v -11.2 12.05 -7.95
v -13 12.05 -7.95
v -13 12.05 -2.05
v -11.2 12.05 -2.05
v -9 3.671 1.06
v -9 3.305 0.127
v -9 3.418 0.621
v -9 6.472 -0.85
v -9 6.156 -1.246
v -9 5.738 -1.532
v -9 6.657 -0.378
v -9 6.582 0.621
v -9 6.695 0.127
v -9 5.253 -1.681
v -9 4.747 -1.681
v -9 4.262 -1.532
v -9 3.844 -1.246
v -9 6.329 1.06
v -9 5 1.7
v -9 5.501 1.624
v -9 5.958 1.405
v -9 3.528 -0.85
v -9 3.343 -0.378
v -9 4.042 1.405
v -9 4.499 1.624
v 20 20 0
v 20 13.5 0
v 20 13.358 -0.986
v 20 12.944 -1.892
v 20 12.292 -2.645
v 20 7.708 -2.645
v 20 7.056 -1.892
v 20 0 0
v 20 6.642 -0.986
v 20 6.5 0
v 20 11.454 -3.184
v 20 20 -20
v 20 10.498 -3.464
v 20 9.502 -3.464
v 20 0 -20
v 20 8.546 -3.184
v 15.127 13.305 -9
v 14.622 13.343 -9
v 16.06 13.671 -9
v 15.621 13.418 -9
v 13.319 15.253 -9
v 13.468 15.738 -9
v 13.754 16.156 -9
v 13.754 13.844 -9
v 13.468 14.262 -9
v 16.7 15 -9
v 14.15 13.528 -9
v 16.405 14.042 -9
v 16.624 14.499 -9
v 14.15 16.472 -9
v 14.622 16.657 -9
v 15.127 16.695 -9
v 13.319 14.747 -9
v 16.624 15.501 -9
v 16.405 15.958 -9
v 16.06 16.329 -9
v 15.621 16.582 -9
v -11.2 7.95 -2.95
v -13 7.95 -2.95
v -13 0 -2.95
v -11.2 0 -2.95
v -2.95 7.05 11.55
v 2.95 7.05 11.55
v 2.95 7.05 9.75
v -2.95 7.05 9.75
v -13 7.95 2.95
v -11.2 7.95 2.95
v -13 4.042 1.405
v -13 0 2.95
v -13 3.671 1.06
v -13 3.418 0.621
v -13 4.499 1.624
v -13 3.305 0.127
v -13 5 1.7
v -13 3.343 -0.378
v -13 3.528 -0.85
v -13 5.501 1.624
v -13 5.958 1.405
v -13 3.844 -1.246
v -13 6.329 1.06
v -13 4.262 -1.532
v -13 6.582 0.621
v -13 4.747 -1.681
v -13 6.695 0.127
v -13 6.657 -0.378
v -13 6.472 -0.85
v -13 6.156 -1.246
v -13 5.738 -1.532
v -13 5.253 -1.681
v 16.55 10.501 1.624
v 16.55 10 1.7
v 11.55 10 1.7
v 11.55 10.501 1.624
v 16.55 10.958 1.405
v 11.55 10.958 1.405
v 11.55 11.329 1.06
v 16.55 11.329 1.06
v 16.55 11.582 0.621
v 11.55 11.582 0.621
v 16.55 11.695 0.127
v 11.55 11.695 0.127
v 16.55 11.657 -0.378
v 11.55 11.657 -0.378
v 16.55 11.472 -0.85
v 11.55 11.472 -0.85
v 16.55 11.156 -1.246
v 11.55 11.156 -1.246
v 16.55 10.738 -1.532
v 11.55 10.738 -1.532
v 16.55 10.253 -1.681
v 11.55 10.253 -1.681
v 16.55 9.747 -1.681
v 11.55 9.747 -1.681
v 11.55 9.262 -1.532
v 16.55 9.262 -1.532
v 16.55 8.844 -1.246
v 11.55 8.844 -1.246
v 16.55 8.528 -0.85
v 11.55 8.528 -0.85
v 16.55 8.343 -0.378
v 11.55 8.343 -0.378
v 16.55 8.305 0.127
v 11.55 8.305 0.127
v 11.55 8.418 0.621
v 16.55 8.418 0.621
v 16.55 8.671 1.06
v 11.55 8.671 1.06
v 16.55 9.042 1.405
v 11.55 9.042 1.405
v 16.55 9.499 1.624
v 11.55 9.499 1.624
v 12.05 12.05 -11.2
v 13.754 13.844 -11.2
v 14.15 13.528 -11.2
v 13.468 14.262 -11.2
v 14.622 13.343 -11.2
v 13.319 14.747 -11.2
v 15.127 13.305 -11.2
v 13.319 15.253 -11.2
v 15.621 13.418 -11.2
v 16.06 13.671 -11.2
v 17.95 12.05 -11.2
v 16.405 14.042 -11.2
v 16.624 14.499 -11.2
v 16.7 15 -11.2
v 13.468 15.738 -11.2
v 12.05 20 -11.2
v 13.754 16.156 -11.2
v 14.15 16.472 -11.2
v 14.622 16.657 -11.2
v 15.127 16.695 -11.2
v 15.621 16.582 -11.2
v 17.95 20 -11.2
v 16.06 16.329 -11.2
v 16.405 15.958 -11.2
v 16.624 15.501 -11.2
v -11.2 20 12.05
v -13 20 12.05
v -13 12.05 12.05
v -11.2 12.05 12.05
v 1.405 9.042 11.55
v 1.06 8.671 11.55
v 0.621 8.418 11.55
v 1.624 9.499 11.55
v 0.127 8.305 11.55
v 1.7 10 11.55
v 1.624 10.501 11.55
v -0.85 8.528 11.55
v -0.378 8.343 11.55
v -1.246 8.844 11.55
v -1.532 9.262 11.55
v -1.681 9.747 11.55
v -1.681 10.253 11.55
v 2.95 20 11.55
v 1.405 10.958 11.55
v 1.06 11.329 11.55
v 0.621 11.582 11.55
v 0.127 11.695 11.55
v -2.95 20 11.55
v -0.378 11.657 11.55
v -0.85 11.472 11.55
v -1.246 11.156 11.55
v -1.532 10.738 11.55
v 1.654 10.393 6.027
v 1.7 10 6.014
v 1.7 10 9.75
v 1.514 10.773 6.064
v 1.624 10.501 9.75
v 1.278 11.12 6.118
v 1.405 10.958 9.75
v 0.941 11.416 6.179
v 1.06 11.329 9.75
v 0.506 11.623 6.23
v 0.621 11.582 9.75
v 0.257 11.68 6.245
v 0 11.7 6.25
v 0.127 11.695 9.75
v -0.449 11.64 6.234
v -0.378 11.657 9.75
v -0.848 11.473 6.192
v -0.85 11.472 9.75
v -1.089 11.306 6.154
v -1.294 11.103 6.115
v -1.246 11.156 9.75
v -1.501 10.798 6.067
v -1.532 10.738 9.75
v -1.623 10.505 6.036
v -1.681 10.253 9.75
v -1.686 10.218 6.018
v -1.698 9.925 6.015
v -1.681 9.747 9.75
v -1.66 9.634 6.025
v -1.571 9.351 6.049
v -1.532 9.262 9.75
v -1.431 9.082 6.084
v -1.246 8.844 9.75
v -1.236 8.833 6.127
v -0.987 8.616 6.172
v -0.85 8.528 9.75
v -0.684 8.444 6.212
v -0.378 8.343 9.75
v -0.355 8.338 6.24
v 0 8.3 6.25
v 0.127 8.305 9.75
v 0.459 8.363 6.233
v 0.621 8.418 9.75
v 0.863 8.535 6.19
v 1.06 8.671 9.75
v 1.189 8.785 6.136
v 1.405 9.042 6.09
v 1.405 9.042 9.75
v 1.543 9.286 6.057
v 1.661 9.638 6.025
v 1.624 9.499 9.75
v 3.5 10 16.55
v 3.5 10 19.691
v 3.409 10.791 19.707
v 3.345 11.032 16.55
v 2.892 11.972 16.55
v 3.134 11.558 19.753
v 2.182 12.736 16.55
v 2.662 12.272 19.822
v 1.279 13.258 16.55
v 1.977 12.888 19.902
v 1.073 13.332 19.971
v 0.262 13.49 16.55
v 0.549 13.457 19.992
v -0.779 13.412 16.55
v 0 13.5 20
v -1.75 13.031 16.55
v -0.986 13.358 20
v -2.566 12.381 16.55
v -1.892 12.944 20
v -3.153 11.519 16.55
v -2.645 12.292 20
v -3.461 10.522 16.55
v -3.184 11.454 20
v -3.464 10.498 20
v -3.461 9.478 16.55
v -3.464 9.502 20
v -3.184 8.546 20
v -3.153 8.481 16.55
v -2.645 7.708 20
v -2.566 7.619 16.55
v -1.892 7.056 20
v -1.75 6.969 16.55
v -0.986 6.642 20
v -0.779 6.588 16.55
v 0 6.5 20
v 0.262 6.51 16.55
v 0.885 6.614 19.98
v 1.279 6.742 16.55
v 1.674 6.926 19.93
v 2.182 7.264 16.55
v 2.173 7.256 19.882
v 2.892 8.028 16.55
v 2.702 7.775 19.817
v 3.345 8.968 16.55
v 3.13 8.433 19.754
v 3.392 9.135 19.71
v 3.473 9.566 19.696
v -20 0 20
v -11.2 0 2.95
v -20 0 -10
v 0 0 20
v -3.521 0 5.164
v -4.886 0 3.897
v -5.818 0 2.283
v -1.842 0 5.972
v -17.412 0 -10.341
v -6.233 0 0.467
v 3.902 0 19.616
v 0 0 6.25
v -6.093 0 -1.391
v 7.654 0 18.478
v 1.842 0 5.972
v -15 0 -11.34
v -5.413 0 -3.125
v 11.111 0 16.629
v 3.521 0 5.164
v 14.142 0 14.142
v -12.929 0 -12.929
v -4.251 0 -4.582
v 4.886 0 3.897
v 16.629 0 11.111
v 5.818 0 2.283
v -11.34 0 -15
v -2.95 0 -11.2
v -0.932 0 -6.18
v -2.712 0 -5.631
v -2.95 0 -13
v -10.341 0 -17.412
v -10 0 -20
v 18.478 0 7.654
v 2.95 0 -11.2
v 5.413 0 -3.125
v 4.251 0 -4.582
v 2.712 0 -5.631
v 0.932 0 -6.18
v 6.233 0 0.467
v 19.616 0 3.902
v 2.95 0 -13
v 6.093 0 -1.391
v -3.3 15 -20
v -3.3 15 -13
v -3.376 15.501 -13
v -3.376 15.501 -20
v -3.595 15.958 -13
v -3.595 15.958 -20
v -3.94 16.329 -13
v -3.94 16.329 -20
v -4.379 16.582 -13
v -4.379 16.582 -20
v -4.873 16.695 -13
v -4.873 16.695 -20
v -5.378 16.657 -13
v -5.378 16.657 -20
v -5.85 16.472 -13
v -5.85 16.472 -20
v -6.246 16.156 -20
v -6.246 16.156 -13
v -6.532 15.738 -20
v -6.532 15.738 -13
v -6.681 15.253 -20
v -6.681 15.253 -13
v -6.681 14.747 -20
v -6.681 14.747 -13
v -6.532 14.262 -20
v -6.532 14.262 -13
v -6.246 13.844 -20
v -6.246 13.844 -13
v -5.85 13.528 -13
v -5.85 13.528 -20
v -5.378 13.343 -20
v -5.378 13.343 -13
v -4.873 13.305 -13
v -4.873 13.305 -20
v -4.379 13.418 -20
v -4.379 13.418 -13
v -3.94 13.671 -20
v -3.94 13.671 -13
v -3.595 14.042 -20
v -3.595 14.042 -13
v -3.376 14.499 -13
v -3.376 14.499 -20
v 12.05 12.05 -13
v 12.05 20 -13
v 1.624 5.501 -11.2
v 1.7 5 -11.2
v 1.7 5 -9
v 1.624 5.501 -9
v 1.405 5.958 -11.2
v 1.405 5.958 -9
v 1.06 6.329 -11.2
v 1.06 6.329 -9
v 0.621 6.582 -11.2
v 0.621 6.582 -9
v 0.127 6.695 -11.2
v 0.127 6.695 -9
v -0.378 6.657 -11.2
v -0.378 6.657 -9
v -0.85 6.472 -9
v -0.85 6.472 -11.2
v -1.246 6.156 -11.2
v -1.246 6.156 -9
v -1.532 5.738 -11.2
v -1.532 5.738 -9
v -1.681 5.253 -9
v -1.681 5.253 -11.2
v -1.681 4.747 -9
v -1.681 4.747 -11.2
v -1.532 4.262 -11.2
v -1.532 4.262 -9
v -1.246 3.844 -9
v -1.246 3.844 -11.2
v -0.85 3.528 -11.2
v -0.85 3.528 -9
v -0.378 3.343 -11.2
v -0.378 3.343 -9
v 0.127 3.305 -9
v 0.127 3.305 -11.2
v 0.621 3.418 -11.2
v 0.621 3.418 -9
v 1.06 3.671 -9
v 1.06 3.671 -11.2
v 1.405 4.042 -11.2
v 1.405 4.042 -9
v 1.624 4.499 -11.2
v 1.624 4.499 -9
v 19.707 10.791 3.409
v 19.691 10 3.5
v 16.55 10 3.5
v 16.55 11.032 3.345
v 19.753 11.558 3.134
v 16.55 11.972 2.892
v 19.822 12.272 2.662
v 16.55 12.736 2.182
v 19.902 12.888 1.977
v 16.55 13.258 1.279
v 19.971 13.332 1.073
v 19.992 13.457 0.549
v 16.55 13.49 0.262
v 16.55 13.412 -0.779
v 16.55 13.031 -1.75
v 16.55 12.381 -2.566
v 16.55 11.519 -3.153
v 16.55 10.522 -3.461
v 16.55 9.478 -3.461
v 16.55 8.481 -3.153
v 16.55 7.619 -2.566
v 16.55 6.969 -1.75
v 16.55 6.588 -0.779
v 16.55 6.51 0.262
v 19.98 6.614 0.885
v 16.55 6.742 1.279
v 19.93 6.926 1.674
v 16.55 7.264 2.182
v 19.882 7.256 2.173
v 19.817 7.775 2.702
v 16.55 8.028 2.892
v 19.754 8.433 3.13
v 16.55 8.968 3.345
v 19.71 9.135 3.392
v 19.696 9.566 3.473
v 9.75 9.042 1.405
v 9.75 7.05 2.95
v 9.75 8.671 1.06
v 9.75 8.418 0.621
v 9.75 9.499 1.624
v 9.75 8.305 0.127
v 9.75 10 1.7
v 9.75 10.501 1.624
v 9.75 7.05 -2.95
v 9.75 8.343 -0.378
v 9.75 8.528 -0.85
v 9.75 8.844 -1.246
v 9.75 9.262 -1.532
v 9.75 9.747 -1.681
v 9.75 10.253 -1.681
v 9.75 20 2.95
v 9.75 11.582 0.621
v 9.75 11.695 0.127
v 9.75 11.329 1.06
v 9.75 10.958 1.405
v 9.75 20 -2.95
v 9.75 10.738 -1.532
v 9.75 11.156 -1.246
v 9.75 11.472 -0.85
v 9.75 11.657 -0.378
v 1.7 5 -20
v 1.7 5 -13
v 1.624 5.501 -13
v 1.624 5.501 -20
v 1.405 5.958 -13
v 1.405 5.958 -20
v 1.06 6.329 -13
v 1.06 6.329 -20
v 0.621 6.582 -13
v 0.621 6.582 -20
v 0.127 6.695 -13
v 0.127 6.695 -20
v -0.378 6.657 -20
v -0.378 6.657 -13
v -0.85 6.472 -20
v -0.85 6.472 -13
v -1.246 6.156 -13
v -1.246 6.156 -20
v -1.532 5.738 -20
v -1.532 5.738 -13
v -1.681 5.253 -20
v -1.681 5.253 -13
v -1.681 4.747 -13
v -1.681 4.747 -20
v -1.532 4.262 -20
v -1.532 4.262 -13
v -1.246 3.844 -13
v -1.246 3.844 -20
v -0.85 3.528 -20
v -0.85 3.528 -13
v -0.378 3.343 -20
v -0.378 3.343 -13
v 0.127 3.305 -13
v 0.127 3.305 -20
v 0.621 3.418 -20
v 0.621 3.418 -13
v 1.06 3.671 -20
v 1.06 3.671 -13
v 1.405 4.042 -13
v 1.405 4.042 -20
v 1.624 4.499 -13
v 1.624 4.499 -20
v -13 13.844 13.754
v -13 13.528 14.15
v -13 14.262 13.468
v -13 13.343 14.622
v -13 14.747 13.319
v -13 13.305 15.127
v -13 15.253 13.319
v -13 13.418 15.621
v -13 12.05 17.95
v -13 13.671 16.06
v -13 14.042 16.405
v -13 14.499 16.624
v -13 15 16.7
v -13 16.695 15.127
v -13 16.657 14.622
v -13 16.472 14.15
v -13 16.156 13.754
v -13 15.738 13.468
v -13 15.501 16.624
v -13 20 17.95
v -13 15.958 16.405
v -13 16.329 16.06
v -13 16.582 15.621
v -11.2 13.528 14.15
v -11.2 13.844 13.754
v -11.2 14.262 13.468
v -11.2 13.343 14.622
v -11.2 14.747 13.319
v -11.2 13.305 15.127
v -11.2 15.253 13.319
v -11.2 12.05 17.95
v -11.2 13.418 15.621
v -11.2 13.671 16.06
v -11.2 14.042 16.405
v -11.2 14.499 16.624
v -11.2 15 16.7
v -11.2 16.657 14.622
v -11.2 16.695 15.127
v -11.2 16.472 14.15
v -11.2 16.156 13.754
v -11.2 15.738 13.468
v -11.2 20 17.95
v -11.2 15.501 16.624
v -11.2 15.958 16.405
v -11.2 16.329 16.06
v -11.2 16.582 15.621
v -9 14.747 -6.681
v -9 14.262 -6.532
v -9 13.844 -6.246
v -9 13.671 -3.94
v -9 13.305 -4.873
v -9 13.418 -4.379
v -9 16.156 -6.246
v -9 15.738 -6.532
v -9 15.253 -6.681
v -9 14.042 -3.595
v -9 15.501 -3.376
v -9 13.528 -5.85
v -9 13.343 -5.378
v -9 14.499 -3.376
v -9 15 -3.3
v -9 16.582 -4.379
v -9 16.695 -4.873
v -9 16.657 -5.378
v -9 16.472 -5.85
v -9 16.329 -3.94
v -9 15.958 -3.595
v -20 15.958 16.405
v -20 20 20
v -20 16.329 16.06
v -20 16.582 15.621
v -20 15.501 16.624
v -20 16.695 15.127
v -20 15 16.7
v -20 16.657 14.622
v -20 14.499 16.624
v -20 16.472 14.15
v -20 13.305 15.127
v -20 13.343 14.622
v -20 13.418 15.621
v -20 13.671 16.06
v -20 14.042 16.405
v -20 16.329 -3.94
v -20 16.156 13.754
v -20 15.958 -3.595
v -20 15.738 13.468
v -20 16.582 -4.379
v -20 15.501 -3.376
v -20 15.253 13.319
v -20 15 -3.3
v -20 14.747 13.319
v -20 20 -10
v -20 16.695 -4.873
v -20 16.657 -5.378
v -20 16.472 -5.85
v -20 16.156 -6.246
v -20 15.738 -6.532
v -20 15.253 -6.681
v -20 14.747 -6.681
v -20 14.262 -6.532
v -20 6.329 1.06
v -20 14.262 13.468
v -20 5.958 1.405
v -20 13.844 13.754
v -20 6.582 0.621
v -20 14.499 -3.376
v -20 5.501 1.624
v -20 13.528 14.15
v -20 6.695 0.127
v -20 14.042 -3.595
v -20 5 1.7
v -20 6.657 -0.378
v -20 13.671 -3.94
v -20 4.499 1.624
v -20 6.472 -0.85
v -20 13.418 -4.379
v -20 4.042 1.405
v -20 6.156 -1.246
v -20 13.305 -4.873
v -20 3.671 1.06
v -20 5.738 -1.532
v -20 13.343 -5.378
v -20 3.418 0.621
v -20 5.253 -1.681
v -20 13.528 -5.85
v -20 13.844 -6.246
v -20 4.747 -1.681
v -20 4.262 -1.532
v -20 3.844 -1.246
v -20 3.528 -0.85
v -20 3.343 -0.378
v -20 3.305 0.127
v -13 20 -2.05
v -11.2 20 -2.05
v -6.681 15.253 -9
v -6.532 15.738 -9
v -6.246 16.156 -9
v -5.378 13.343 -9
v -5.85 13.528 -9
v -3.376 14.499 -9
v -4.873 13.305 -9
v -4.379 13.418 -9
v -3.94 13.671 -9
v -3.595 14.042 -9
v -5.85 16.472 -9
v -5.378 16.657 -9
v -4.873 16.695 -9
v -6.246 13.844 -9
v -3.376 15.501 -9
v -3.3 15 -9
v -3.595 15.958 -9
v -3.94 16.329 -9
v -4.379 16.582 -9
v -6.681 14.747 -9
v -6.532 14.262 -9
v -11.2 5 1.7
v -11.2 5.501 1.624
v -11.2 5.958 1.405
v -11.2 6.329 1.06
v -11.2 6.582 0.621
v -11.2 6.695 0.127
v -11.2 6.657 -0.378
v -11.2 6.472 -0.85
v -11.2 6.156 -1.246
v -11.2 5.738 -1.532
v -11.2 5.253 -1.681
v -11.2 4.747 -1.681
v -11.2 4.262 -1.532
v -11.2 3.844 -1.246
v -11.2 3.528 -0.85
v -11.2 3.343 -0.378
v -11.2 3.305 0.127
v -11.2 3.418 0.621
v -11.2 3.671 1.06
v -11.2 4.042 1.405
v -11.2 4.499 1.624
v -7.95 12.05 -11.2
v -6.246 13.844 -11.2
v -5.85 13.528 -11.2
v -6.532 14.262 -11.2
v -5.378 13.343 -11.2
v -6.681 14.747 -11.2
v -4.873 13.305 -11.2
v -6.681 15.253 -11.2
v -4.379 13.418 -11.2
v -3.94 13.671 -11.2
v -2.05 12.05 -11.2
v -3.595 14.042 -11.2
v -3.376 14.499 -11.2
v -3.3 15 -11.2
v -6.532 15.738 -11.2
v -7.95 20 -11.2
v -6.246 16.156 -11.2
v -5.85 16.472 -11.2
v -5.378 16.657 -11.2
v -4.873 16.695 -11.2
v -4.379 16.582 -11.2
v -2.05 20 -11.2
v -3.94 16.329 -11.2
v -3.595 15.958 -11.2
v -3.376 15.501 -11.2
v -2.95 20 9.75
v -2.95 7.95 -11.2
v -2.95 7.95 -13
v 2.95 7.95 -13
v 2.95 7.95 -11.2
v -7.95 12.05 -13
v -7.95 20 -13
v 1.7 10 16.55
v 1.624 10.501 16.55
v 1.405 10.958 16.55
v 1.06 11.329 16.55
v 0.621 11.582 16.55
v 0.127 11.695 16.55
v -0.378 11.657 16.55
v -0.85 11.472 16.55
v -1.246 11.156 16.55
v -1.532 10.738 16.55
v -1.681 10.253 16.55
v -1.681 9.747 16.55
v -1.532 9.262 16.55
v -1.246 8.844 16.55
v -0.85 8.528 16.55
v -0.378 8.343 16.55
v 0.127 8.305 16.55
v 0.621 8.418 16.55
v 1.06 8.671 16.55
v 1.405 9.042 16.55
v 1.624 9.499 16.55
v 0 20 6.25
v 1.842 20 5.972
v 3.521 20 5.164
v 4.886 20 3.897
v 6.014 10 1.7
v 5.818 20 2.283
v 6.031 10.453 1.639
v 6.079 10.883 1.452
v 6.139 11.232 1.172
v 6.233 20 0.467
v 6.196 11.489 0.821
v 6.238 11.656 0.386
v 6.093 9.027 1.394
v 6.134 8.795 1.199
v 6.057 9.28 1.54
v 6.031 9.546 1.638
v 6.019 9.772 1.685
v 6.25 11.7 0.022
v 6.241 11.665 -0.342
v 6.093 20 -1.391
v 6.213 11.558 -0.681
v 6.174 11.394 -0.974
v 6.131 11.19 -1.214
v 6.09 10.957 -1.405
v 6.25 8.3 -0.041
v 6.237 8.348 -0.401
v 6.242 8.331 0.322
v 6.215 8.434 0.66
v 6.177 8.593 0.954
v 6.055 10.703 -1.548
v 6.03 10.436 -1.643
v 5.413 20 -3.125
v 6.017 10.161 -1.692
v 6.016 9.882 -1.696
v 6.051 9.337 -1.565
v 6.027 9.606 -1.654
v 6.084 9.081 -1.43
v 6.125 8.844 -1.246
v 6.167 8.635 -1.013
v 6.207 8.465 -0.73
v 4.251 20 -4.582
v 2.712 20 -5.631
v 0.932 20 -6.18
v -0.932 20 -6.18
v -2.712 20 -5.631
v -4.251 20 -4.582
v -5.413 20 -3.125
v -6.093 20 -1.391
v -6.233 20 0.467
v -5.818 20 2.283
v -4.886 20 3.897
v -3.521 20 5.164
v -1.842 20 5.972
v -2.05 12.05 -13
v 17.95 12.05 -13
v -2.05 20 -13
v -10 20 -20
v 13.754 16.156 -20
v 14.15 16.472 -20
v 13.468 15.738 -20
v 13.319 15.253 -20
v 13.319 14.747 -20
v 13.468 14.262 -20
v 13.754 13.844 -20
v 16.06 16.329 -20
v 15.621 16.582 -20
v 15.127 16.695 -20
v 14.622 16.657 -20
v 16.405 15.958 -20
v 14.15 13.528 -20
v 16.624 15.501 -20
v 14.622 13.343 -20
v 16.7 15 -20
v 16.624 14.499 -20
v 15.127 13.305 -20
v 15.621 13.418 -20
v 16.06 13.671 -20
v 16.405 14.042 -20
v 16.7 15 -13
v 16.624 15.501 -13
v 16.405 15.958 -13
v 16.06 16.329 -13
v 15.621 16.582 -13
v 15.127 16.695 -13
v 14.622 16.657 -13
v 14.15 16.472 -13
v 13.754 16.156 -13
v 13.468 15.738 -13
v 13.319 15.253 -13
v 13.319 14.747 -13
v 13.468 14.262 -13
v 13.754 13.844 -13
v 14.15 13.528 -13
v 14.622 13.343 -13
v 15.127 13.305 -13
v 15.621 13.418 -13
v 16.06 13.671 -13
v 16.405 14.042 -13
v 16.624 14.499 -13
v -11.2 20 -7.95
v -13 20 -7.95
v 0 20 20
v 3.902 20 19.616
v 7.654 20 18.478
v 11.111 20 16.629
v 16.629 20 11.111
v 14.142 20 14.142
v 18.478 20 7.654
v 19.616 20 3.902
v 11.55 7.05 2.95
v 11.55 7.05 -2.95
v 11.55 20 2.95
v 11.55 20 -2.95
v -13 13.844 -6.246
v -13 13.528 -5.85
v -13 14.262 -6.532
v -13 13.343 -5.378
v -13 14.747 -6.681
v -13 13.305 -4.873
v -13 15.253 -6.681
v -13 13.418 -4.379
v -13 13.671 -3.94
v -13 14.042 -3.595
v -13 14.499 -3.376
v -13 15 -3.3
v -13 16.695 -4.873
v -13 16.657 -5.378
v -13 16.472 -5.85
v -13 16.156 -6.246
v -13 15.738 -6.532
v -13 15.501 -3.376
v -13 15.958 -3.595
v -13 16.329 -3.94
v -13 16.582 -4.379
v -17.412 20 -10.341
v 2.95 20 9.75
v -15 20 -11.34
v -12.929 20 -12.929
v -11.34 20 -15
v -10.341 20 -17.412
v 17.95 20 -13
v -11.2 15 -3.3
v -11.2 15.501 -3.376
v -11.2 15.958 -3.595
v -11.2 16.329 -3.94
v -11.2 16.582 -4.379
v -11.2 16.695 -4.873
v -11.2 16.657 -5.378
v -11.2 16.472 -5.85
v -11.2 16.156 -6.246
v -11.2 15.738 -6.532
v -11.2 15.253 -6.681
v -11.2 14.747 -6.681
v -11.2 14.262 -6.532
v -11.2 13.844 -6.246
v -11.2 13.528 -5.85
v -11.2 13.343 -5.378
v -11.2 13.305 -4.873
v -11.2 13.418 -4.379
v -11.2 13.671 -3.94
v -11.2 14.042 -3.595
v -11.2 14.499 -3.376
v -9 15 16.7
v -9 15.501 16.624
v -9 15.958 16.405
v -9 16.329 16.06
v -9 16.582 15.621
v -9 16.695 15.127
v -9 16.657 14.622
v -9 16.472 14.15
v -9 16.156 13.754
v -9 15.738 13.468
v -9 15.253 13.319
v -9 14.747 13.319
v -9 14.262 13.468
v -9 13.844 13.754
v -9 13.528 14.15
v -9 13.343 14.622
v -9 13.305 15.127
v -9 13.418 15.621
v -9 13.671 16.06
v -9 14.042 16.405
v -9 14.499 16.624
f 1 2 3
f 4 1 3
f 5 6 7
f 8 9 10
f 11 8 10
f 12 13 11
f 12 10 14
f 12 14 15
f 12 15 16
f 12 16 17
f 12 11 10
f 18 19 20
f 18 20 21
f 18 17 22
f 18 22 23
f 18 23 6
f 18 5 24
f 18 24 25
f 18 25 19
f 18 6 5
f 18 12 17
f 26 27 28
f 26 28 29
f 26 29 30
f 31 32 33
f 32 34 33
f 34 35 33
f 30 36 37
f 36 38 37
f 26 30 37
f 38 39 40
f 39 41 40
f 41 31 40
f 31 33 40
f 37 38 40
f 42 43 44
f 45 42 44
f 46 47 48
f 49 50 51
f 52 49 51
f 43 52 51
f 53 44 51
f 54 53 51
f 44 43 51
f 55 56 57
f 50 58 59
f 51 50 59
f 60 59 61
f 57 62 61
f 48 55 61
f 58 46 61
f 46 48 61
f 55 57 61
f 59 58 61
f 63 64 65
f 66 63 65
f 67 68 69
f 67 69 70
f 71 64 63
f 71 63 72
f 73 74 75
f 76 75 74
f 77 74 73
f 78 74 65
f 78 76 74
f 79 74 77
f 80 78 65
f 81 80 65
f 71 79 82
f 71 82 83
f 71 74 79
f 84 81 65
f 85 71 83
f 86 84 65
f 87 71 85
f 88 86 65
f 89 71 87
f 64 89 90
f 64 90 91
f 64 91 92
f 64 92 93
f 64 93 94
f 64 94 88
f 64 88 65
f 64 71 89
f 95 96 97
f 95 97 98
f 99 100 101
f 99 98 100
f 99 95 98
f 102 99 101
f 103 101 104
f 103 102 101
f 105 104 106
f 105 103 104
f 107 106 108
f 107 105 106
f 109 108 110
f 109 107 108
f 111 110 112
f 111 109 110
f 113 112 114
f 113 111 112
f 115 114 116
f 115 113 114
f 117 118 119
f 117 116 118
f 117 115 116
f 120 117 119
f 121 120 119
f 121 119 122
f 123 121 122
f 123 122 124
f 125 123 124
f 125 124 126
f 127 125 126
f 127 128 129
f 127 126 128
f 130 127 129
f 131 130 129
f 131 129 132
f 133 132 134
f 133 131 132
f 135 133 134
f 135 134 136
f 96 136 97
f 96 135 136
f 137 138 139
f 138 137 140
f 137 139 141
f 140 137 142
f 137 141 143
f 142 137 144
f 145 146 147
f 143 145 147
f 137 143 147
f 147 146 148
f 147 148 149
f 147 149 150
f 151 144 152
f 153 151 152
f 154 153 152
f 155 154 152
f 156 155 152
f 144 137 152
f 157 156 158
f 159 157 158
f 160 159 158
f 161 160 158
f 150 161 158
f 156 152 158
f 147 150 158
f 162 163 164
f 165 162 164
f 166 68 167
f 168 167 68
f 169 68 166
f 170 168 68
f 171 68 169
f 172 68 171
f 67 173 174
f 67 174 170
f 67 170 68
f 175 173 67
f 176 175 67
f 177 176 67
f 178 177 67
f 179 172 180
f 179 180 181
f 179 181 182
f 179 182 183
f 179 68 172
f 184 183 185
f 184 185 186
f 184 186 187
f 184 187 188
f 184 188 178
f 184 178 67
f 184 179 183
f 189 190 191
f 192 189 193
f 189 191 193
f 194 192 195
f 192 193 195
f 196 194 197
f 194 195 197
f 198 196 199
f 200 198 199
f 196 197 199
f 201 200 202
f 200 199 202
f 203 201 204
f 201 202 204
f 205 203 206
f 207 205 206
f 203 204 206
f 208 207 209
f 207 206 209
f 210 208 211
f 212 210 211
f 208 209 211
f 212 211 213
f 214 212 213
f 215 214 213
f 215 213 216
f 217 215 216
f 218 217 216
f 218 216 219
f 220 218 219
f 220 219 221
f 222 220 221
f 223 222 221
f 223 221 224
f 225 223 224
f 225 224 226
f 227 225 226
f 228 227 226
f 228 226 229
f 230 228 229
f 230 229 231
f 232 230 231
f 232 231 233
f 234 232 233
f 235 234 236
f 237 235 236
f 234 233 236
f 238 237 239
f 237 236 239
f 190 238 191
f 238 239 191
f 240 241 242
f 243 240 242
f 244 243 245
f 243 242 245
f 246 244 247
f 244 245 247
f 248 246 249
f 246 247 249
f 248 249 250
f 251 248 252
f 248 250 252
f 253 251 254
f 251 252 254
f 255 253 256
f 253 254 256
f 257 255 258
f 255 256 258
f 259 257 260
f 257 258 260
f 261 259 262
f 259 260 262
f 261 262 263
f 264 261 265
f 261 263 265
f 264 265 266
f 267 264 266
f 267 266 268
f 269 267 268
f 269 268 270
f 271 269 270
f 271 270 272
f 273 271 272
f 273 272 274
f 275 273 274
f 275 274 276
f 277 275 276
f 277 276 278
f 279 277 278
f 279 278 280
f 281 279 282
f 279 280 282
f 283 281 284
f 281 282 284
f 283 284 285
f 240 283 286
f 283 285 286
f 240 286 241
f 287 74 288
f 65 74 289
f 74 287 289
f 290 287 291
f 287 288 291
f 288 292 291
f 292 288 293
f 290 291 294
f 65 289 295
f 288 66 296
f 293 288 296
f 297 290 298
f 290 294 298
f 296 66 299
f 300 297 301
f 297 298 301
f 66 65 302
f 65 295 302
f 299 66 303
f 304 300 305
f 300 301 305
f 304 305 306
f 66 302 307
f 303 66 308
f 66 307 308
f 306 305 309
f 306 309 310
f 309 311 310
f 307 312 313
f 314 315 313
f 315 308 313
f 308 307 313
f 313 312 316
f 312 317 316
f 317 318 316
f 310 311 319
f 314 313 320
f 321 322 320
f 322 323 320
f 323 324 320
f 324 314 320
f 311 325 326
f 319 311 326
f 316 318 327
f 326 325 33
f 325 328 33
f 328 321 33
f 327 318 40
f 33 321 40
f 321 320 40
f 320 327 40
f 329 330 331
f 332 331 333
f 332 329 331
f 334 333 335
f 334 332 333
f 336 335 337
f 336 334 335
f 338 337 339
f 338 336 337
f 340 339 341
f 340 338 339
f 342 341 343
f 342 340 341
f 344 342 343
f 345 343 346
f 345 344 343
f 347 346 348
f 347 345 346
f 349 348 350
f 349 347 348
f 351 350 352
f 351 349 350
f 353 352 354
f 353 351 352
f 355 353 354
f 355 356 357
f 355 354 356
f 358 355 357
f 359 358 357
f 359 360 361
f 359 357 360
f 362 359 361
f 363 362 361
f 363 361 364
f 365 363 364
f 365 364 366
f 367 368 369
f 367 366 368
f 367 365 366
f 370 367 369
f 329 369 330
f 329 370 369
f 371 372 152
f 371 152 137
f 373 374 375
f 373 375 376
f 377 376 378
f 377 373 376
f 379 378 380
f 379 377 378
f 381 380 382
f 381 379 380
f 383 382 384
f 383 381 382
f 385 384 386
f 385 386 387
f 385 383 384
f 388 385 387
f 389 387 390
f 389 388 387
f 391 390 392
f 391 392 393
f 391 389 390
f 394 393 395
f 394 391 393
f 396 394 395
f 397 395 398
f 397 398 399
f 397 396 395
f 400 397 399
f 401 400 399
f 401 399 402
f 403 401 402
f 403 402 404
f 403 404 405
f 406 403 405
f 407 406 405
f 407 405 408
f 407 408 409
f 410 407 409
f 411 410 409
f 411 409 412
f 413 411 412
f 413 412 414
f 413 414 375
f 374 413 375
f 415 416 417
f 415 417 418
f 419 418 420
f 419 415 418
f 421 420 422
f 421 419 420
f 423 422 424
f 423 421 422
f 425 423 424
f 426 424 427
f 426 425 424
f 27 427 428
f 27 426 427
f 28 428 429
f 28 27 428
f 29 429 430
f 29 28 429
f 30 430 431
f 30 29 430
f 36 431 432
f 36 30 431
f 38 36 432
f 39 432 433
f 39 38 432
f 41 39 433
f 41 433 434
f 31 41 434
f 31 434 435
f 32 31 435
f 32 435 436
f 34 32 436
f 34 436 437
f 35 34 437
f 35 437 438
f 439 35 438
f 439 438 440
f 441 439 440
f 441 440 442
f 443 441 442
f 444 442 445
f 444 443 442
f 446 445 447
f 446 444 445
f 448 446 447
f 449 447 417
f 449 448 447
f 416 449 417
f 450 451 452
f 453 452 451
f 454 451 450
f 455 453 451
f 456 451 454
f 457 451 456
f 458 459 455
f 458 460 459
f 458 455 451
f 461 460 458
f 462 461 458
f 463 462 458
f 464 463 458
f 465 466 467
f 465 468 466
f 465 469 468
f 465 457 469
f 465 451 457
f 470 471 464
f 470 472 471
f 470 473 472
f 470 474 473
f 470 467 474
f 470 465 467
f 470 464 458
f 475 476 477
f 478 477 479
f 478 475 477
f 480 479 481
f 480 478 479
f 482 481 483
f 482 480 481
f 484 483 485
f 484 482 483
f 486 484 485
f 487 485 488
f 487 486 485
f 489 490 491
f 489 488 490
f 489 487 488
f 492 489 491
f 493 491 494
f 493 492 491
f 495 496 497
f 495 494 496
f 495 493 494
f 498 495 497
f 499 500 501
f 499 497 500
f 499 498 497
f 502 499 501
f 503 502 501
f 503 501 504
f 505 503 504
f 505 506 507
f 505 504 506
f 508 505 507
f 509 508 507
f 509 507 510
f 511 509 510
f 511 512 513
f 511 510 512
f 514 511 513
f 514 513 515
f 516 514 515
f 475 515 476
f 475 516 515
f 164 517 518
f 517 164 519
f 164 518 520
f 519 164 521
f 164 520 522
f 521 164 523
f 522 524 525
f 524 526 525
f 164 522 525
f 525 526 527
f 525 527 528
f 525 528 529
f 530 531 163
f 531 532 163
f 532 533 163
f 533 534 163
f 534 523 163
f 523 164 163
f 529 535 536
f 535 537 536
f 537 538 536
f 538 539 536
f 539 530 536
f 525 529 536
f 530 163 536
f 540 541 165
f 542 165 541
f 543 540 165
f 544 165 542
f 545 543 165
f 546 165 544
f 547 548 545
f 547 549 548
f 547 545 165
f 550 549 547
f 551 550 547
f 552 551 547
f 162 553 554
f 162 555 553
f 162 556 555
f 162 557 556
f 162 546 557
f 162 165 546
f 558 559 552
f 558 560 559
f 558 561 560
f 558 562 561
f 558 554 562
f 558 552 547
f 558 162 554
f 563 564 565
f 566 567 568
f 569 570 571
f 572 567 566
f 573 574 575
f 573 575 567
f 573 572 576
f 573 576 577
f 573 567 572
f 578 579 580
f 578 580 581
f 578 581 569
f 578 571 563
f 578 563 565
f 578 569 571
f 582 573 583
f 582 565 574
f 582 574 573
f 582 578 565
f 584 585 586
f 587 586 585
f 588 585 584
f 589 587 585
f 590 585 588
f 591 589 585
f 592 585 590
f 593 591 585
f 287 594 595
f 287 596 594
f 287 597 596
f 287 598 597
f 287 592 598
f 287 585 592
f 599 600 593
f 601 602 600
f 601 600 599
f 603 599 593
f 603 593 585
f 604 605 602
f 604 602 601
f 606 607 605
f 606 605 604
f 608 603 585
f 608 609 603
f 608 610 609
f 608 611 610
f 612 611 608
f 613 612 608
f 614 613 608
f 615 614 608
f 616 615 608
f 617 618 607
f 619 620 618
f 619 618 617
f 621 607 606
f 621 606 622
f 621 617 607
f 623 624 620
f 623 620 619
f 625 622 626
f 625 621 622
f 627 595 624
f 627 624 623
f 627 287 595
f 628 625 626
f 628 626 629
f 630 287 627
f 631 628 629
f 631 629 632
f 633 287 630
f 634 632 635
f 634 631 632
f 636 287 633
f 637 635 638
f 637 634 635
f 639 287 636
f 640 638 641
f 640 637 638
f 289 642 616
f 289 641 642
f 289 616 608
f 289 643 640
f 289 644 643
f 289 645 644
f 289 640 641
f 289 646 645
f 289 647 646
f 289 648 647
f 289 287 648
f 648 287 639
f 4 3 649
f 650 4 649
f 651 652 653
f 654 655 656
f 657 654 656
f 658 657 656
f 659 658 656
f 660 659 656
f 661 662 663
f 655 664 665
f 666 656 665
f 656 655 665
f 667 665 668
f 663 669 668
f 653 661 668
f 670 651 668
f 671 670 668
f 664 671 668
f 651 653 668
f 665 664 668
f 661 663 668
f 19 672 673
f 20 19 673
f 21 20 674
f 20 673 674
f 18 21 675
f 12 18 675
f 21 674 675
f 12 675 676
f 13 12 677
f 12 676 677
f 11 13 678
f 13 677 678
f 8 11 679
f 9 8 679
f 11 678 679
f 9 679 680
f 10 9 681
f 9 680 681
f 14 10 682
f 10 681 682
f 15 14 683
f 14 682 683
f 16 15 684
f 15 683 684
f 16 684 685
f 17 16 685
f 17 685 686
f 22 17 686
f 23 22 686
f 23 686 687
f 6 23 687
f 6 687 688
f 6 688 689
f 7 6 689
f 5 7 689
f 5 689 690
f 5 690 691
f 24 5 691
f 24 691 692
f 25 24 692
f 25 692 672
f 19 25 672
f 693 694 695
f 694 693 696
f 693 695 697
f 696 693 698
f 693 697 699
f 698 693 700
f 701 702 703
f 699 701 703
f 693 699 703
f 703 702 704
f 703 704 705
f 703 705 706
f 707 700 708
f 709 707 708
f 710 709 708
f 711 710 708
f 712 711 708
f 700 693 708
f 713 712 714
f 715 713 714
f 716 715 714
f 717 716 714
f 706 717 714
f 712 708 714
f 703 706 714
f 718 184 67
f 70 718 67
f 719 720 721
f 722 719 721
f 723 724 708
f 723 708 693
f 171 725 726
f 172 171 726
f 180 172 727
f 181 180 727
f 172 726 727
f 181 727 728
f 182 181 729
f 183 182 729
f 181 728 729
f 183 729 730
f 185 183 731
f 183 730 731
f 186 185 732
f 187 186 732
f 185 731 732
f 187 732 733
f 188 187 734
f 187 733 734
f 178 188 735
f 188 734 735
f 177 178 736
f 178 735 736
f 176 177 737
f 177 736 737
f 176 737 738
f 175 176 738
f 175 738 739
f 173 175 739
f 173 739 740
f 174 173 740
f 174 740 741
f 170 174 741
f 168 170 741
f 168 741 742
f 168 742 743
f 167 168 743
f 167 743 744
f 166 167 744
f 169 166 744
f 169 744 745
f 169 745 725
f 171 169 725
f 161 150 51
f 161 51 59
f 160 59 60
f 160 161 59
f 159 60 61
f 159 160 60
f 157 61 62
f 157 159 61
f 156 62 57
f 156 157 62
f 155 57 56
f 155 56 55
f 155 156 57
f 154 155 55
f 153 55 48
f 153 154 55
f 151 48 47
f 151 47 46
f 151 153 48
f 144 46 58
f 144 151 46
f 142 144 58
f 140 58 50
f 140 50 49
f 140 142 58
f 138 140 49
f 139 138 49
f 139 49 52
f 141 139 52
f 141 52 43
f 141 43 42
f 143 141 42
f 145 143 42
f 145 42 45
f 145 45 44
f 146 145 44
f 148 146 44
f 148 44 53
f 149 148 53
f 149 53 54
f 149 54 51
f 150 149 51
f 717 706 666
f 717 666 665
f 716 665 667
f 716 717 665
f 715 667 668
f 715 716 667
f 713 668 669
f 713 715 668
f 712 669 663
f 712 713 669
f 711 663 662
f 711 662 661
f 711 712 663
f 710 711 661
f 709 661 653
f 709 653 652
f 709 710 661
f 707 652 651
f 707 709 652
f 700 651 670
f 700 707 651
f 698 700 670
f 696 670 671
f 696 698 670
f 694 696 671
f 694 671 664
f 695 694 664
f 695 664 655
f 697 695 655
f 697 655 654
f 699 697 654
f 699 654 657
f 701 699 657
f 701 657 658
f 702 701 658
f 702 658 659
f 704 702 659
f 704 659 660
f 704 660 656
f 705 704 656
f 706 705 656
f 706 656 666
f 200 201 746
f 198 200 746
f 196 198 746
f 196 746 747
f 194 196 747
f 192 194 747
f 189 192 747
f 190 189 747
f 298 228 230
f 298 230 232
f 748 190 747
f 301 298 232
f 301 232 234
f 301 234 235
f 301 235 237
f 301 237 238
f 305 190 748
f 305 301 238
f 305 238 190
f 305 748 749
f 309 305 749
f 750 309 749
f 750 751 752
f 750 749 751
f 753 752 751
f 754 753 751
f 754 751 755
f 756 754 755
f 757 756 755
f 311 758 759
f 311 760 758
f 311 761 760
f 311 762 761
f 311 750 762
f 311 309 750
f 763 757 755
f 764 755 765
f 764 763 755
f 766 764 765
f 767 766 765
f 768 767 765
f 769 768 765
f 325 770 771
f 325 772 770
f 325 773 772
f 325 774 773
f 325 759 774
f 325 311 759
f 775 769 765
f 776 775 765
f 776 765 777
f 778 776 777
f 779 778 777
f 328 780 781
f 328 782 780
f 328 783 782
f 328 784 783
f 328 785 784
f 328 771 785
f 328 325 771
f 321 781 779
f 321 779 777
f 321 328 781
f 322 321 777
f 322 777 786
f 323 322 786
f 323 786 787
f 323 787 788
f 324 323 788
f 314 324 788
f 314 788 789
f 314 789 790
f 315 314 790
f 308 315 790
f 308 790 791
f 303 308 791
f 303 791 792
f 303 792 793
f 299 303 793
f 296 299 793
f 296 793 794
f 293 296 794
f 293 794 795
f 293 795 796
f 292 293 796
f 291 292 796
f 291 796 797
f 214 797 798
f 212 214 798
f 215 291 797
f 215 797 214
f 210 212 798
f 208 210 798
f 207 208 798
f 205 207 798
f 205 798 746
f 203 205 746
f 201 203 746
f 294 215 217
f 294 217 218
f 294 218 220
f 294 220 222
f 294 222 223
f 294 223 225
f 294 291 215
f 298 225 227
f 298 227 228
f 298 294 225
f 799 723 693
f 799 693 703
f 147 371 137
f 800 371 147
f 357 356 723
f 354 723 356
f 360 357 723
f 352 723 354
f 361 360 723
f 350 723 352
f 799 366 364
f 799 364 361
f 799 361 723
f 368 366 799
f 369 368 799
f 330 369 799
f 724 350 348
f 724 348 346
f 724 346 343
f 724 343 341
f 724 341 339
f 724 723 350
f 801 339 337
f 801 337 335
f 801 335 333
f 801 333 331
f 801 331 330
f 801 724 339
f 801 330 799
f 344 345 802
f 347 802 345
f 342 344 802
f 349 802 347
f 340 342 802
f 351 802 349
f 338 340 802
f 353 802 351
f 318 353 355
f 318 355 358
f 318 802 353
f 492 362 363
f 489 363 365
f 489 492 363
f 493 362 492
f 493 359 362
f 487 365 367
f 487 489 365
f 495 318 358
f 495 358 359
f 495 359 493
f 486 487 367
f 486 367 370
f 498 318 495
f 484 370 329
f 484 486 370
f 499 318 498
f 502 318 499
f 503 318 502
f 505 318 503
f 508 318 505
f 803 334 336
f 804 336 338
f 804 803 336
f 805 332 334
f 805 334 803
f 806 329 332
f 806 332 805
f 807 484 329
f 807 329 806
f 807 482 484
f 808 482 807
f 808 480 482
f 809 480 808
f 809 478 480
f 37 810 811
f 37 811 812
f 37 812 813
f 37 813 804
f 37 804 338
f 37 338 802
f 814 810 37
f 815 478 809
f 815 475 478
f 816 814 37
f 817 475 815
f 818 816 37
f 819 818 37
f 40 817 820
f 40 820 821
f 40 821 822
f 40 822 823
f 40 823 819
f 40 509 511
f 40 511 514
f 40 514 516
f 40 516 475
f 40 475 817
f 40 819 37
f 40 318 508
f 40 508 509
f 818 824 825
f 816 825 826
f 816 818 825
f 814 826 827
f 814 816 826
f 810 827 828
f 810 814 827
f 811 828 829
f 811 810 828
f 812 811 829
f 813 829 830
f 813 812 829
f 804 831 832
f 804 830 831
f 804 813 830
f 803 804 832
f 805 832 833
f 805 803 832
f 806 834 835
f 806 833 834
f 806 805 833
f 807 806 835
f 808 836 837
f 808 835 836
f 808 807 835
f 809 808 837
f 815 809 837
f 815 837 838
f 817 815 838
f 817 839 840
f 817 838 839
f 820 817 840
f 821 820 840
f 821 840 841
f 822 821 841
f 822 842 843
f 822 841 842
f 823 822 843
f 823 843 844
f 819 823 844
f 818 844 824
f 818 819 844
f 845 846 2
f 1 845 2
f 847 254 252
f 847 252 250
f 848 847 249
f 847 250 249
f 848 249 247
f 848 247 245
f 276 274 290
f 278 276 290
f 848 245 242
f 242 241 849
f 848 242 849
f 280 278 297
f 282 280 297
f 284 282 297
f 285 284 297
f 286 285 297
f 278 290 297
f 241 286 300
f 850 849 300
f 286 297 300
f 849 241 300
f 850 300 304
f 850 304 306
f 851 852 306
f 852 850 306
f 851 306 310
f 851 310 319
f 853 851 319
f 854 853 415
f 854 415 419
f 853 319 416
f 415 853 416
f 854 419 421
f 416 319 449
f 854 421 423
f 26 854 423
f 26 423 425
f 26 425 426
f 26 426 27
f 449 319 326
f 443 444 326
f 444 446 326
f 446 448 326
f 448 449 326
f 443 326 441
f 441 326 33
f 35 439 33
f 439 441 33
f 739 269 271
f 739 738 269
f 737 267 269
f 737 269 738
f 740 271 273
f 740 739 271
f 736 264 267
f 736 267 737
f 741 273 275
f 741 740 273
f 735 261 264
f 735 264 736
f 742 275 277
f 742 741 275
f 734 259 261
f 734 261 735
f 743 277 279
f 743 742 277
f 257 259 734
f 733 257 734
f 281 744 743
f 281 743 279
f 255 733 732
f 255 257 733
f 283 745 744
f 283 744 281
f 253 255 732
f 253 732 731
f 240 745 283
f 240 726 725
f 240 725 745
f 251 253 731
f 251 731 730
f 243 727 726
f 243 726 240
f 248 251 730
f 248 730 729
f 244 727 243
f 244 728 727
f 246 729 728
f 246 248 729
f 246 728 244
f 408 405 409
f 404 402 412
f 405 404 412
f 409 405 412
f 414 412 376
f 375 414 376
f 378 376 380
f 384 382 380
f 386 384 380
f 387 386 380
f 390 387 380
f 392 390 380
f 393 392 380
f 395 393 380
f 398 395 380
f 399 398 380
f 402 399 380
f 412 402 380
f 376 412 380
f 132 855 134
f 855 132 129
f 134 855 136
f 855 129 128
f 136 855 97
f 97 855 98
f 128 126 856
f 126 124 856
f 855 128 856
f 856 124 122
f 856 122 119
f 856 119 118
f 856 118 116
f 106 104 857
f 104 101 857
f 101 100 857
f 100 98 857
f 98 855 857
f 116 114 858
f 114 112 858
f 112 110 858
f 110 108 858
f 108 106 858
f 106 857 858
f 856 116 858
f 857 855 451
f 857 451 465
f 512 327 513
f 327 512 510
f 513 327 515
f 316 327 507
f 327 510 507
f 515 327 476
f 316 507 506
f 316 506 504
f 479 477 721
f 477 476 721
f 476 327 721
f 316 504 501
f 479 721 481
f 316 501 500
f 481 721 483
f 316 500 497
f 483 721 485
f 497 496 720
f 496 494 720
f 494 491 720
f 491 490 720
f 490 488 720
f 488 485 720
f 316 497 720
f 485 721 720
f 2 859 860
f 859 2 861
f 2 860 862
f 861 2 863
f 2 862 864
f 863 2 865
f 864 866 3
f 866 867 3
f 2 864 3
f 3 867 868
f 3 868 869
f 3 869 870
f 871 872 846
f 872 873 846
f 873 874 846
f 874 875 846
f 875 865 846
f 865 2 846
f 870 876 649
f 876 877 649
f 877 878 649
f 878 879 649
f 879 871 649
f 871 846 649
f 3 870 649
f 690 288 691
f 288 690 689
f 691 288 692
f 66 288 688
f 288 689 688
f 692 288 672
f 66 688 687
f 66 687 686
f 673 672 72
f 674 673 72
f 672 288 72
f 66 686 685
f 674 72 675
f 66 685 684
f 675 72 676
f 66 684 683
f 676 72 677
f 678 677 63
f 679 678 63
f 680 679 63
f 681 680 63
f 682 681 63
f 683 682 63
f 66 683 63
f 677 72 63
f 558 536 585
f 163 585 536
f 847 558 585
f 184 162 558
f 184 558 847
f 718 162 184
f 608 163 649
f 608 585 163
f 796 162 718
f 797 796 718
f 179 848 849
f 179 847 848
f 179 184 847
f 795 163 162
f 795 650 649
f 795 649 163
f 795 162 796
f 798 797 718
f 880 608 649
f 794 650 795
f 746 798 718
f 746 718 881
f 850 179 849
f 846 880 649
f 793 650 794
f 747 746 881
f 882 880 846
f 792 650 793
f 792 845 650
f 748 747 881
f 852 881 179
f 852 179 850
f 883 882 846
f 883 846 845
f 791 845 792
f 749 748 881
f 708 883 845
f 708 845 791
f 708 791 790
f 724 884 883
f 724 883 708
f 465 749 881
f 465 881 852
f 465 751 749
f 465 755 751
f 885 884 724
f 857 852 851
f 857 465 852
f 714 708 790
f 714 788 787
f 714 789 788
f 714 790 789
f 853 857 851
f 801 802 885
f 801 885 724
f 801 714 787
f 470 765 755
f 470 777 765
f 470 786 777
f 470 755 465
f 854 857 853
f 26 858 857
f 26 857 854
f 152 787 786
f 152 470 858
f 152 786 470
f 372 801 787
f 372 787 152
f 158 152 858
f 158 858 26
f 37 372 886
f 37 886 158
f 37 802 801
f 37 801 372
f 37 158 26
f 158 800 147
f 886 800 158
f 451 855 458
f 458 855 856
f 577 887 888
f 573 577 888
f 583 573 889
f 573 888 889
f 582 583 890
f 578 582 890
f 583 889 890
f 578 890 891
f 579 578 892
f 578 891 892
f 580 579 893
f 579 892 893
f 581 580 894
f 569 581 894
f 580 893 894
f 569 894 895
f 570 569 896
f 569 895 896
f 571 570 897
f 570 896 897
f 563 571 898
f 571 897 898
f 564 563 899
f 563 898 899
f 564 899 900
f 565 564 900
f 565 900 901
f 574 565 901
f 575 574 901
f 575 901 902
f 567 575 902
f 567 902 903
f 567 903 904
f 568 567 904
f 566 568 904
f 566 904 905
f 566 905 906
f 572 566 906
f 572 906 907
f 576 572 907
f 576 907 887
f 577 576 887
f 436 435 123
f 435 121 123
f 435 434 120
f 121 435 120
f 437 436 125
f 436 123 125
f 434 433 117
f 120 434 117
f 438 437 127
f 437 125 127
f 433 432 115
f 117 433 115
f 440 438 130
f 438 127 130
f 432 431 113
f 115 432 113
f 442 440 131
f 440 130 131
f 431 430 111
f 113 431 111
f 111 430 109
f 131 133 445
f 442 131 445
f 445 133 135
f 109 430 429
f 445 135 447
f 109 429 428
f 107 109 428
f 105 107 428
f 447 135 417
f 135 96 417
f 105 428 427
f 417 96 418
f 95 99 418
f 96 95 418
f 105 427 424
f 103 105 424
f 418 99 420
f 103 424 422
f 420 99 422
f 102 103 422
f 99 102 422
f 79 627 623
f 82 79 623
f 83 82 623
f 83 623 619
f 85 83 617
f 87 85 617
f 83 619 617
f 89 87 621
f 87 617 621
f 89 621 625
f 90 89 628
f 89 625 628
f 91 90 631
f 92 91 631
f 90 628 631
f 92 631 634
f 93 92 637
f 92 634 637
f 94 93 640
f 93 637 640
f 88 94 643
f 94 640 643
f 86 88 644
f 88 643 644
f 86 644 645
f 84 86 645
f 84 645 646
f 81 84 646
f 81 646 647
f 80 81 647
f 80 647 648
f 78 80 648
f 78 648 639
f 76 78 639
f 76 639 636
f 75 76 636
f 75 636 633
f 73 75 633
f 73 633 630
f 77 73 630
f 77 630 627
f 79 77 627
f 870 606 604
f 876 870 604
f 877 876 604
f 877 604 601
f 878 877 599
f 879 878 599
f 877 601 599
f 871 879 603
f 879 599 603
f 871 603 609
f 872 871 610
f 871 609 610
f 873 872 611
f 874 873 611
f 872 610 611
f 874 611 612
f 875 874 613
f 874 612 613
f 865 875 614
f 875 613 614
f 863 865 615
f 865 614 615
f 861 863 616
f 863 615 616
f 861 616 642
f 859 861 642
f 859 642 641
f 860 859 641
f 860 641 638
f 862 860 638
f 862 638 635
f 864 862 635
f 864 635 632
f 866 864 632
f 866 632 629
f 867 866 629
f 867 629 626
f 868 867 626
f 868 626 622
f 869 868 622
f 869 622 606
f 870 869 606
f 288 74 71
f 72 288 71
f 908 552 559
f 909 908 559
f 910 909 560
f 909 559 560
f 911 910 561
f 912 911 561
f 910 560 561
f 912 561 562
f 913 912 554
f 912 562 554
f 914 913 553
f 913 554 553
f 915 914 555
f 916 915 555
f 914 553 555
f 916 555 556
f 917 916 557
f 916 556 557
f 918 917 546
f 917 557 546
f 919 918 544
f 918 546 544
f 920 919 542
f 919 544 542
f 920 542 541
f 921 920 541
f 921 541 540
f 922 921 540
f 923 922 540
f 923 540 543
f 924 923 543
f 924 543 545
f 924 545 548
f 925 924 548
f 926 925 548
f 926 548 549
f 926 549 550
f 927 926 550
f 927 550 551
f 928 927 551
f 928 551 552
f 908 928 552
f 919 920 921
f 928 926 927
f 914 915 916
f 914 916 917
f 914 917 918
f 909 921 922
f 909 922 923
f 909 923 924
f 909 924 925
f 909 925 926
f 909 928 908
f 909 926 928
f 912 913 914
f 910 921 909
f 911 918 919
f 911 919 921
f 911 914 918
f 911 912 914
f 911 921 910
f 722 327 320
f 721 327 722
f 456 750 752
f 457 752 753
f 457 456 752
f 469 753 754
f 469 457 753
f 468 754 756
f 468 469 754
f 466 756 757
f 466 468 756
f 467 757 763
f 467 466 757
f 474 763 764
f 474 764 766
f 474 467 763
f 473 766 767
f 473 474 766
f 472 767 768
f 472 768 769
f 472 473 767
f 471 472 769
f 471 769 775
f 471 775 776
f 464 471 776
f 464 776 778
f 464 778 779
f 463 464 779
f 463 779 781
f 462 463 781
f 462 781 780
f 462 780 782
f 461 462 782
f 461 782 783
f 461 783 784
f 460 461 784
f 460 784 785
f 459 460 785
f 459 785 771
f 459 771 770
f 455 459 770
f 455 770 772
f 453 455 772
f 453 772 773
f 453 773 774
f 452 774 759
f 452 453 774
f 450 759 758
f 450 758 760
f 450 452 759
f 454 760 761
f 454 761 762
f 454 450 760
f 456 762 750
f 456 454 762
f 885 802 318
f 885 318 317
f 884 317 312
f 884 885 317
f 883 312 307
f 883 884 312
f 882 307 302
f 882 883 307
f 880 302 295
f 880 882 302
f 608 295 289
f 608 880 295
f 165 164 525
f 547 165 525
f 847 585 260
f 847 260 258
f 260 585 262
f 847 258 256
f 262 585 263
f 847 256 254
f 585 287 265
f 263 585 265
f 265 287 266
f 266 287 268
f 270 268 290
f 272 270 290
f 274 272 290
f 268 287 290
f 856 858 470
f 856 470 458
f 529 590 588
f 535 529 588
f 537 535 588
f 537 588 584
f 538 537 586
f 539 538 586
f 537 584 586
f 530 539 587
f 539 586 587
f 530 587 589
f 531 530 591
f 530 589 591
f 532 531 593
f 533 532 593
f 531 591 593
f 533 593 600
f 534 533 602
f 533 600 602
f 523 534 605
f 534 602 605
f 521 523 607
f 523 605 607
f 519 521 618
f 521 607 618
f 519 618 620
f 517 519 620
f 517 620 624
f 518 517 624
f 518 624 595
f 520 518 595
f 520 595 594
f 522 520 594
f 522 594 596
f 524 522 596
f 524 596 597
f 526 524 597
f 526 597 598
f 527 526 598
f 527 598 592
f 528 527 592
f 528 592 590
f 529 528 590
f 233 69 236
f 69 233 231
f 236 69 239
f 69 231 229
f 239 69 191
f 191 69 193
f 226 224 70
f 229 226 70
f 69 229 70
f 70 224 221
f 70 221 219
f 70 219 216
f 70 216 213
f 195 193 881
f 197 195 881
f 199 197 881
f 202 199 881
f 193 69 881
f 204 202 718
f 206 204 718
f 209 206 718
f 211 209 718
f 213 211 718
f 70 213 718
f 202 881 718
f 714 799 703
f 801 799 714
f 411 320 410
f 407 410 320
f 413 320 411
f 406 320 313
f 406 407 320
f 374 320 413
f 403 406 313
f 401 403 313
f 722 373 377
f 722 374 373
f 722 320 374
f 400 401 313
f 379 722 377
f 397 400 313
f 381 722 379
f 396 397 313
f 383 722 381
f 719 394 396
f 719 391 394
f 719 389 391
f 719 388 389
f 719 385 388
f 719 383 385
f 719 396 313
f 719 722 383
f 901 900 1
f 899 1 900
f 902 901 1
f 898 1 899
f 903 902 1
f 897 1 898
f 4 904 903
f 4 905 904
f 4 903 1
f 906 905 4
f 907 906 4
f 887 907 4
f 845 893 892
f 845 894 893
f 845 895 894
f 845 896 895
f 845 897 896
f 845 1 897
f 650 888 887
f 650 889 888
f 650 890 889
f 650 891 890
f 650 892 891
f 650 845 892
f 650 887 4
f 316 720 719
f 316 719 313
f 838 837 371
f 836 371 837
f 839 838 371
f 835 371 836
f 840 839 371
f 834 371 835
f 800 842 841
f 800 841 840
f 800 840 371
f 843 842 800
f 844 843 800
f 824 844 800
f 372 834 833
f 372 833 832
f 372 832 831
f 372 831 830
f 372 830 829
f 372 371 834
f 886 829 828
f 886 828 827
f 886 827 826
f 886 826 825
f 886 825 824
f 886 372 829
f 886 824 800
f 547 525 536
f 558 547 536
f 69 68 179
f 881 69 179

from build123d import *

# Parameters (mm, degrees)
SKETCH1_W               = 40
SKETCH1_H               = 40
SKETCH1_R               = 6.25
BOSS_EXTRUDE1_DEPTH     = 20
SKETCH2_R               = 1.7
CUT_EXTRUDE1_DEPTH      = 11
CUT_EXTRUDE2_START      = -7
CUT_EXTRUDE2_DEPTH      = 1.8
CUT_EXTRUDE3_REACH      = 50.99
CUT_EXTRUDE3_END_RADIUS = 6.25
SKETCH4_R               = 1.7
CUT_EXTRUDE4_START      = -8.45
CUT_EXTRUDE4_DEPTH      = 1.8
SKETCH6_R               = 3.5
CUT_EXTRUDE5_DEPTH      = 3.45
FILLET1_R               = 20
CUT_EXTRUDE6_DEPTH      = 35.641016325


with BuildPart() as part:
    # Sketch1 → Boss-Extrude1 (new body)
    with BuildSketch(Plane(origin=(0, 0, 0), x_dir=(1, 0, 0), z_dir=(0, 1, 0))):
        Rectangle(SKETCH1_W, SKETCH1_H)
        with Locations(Location((0, 0, 0), (0, 0, 270))):
            Circle(SKETCH1_R, mode=Mode.SUBTRACT)
    extrude(amount=BOSS_EXTRUDE1_DEPTH)

    # Sketch2 → Cut-Extrude1 (cut)
    with BuildSketch(Plane.ZY.offset(20)):
        with Locations((-5, 15)):
            Circle(SKETCH2_R)
        with Locations((15, 15)):
            Circle(SKETCH2_R)
        with Locations((0, 5)):
            Circle(SKETCH2_R)
    cut_extrude1 = extrude(amount=-CUT_EXTRUDE1_DEPTH, mode=Mode.SUBTRACT)

    # Sketch3 → Cut-Extrude2 (cut)
    with BuildSketch(Plane.ZY.offset(20).offset(CUT_EXTRUDE2_START)):
        Polygon((-7.95, 12.05), (-2.05, 12.05), (-2.05, 17.95), (-2.05, 20), (-7.95, 20), (-7.95, 17.95), align=None)
        Polygon((12.05, 12.05), (17.95, 12.05), (17.95, 17.95), (17.95, 20), (12.05, 20), (12.05, 17.95), align=None)
        Polygon((-2.95, 7.95), (2.95, 7.95), (2.95, 2.05), (2.95, 0), (-2.95, 0), (-2.95, 2.05), align=None)
    cut_extrude2 = extrude(amount=-CUT_EXTRUDE2_DEPTH, mode=Mode.SUBTRACT)

    # Cut-Extrude3: up to this cylinder (the profile starts outside it)
    cut_extrude3_end = Plane(origin=(0, 10, 0), z_dir=(0, -1, 0)) * Cylinder(CUT_EXTRUDE3_END_RADIUS, 115.48, mode=Mode.PRIVATE)
    # Sketch4 → Cut-Extrude3 (cut, up to the surface)
    with BuildSketch(Plane.XY.offset(20), mode=Mode.PRIVATE) as cut_extrude3_sk1:
        with Locations((0, 10)):
            Circle(SKETCH4_R)
    cut_extrude3_tool1 = extrude(cut_extrude3_sk1.sketch, amount=-CUT_EXTRUDE3_REACH, mode=Mode.PRIVATE) - cut_extrude3_end
    cut_extrude3 = cut_extrude3_tool1.solids().sort_by_distance((0, 10, 20))[0]
    add(cut_extrude3, mode=Mode.SUBTRACT)

    # Sketch5 → Cut-Extrude4 (cut)
    with BuildSketch(Plane.XY.offset(20).offset(CUT_EXTRUDE4_START)):
        Polygon((-2.95, 12.95), (-2.95, 20), (2.95, 20), (2.95, 12.95), (2.95, 7.05), (-2.95, 7.05), align=None)
    cut_extrude4 = extrude(amount=-CUT_EXTRUDE4_DEPTH, mode=Mode.SUBTRACT)

    # Sketch6 → Cut-Extrude5 (cut)
    with BuildSketch(Plane.XY.offset(20)):
        with Locations((0, 10)):
            Circle(SKETCH6_R)
    cut_extrude5 = extrude(amount=-CUT_EXTRUDE5_DEPTH, mode=Mode.SUBTRACT)

    # Mirror1: Cut-Extrude1, Cut-Extrude2, Cut-Extrude3, Cut-Extrude4, Cut-Extrude5 across plane
    add(cut_extrude1.mirror(Plane(origin=(0, 0, 0), x_dir=(0.7071067811865476, 0, 0.7071067811865476), z_dir=(-0.7071067811865477, 0, 0.7071067811865475))), mode=Mode.SUBTRACT)
    add(cut_extrude2.mirror(Plane(origin=(0, 0, 0), x_dir=(0.7071067811865476, 0, 0.7071067811865476), z_dir=(-0.7071067811865477, 0, 0.7071067811865475))), mode=Mode.SUBTRACT)
    add(cut_extrude3.mirror(Plane(origin=(0, 0, 0), x_dir=(0.7071067811865476, 0, 0.7071067811865476), z_dir=(-0.7071067811865477, 0, 0.7071067811865475))), mode=Mode.SUBTRACT)
    add(cut_extrude4.mirror(Plane(origin=(0, 0, 0), x_dir=(0.7071067811865476, 0, 0.7071067811865476), z_dir=(-0.7071067811865477, 0, 0.7071067811865475))), mode=Mode.SUBTRACT)
    add(cut_extrude5.mirror(Plane(origin=(0, 0, 0), x_dir=(0.7071067811865476, 0, 0.7071067811865476), z_dir=(-0.7071067811865477, 0, 0.7071067811865475))), mode=Mode.SUBTRACT)

    # Fillet1
    # the kernel refuses this fillet: 20 mm, written as the material it takes off along each edge
    with BuildSketch(Plane(origin=(20, -50, 20), x_dir=(-1, 0, 0), z_dir=(0, 1, 0))) as fillet1_piece_1:
        with BuildLine():
            CenterArc((FILLET1_R, -FILLET1_R), FILLET1_R, 90, 90)
            Line((0, -FILLET1_R), (0, 0))
            Line((0, 0), (FILLET1_R, 0))
        make_face()
    extrude(amount=120, mode=Mode.SUBTRACT)

    # Sketch7 → Cut-Extrude6 (cut, through all)
    with BuildSketch(Plane(origin=(0, 20, 0), x_dir=(1, 0, 0), z_dir=(0, 1, 0))):
        with BuildLine():
            Line((-20, 10), (-20, 20))
            Line((-20, 20), (-10, 20))
            ThreePointArc((-10, 20), (-12.928932188, 12.928932188), (-20, 10))
        make_face()
    extrude(amount=-CUT_EXTRUDE6_DEPTH, mode=Mode.SUBTRACT)


solid = part.part
